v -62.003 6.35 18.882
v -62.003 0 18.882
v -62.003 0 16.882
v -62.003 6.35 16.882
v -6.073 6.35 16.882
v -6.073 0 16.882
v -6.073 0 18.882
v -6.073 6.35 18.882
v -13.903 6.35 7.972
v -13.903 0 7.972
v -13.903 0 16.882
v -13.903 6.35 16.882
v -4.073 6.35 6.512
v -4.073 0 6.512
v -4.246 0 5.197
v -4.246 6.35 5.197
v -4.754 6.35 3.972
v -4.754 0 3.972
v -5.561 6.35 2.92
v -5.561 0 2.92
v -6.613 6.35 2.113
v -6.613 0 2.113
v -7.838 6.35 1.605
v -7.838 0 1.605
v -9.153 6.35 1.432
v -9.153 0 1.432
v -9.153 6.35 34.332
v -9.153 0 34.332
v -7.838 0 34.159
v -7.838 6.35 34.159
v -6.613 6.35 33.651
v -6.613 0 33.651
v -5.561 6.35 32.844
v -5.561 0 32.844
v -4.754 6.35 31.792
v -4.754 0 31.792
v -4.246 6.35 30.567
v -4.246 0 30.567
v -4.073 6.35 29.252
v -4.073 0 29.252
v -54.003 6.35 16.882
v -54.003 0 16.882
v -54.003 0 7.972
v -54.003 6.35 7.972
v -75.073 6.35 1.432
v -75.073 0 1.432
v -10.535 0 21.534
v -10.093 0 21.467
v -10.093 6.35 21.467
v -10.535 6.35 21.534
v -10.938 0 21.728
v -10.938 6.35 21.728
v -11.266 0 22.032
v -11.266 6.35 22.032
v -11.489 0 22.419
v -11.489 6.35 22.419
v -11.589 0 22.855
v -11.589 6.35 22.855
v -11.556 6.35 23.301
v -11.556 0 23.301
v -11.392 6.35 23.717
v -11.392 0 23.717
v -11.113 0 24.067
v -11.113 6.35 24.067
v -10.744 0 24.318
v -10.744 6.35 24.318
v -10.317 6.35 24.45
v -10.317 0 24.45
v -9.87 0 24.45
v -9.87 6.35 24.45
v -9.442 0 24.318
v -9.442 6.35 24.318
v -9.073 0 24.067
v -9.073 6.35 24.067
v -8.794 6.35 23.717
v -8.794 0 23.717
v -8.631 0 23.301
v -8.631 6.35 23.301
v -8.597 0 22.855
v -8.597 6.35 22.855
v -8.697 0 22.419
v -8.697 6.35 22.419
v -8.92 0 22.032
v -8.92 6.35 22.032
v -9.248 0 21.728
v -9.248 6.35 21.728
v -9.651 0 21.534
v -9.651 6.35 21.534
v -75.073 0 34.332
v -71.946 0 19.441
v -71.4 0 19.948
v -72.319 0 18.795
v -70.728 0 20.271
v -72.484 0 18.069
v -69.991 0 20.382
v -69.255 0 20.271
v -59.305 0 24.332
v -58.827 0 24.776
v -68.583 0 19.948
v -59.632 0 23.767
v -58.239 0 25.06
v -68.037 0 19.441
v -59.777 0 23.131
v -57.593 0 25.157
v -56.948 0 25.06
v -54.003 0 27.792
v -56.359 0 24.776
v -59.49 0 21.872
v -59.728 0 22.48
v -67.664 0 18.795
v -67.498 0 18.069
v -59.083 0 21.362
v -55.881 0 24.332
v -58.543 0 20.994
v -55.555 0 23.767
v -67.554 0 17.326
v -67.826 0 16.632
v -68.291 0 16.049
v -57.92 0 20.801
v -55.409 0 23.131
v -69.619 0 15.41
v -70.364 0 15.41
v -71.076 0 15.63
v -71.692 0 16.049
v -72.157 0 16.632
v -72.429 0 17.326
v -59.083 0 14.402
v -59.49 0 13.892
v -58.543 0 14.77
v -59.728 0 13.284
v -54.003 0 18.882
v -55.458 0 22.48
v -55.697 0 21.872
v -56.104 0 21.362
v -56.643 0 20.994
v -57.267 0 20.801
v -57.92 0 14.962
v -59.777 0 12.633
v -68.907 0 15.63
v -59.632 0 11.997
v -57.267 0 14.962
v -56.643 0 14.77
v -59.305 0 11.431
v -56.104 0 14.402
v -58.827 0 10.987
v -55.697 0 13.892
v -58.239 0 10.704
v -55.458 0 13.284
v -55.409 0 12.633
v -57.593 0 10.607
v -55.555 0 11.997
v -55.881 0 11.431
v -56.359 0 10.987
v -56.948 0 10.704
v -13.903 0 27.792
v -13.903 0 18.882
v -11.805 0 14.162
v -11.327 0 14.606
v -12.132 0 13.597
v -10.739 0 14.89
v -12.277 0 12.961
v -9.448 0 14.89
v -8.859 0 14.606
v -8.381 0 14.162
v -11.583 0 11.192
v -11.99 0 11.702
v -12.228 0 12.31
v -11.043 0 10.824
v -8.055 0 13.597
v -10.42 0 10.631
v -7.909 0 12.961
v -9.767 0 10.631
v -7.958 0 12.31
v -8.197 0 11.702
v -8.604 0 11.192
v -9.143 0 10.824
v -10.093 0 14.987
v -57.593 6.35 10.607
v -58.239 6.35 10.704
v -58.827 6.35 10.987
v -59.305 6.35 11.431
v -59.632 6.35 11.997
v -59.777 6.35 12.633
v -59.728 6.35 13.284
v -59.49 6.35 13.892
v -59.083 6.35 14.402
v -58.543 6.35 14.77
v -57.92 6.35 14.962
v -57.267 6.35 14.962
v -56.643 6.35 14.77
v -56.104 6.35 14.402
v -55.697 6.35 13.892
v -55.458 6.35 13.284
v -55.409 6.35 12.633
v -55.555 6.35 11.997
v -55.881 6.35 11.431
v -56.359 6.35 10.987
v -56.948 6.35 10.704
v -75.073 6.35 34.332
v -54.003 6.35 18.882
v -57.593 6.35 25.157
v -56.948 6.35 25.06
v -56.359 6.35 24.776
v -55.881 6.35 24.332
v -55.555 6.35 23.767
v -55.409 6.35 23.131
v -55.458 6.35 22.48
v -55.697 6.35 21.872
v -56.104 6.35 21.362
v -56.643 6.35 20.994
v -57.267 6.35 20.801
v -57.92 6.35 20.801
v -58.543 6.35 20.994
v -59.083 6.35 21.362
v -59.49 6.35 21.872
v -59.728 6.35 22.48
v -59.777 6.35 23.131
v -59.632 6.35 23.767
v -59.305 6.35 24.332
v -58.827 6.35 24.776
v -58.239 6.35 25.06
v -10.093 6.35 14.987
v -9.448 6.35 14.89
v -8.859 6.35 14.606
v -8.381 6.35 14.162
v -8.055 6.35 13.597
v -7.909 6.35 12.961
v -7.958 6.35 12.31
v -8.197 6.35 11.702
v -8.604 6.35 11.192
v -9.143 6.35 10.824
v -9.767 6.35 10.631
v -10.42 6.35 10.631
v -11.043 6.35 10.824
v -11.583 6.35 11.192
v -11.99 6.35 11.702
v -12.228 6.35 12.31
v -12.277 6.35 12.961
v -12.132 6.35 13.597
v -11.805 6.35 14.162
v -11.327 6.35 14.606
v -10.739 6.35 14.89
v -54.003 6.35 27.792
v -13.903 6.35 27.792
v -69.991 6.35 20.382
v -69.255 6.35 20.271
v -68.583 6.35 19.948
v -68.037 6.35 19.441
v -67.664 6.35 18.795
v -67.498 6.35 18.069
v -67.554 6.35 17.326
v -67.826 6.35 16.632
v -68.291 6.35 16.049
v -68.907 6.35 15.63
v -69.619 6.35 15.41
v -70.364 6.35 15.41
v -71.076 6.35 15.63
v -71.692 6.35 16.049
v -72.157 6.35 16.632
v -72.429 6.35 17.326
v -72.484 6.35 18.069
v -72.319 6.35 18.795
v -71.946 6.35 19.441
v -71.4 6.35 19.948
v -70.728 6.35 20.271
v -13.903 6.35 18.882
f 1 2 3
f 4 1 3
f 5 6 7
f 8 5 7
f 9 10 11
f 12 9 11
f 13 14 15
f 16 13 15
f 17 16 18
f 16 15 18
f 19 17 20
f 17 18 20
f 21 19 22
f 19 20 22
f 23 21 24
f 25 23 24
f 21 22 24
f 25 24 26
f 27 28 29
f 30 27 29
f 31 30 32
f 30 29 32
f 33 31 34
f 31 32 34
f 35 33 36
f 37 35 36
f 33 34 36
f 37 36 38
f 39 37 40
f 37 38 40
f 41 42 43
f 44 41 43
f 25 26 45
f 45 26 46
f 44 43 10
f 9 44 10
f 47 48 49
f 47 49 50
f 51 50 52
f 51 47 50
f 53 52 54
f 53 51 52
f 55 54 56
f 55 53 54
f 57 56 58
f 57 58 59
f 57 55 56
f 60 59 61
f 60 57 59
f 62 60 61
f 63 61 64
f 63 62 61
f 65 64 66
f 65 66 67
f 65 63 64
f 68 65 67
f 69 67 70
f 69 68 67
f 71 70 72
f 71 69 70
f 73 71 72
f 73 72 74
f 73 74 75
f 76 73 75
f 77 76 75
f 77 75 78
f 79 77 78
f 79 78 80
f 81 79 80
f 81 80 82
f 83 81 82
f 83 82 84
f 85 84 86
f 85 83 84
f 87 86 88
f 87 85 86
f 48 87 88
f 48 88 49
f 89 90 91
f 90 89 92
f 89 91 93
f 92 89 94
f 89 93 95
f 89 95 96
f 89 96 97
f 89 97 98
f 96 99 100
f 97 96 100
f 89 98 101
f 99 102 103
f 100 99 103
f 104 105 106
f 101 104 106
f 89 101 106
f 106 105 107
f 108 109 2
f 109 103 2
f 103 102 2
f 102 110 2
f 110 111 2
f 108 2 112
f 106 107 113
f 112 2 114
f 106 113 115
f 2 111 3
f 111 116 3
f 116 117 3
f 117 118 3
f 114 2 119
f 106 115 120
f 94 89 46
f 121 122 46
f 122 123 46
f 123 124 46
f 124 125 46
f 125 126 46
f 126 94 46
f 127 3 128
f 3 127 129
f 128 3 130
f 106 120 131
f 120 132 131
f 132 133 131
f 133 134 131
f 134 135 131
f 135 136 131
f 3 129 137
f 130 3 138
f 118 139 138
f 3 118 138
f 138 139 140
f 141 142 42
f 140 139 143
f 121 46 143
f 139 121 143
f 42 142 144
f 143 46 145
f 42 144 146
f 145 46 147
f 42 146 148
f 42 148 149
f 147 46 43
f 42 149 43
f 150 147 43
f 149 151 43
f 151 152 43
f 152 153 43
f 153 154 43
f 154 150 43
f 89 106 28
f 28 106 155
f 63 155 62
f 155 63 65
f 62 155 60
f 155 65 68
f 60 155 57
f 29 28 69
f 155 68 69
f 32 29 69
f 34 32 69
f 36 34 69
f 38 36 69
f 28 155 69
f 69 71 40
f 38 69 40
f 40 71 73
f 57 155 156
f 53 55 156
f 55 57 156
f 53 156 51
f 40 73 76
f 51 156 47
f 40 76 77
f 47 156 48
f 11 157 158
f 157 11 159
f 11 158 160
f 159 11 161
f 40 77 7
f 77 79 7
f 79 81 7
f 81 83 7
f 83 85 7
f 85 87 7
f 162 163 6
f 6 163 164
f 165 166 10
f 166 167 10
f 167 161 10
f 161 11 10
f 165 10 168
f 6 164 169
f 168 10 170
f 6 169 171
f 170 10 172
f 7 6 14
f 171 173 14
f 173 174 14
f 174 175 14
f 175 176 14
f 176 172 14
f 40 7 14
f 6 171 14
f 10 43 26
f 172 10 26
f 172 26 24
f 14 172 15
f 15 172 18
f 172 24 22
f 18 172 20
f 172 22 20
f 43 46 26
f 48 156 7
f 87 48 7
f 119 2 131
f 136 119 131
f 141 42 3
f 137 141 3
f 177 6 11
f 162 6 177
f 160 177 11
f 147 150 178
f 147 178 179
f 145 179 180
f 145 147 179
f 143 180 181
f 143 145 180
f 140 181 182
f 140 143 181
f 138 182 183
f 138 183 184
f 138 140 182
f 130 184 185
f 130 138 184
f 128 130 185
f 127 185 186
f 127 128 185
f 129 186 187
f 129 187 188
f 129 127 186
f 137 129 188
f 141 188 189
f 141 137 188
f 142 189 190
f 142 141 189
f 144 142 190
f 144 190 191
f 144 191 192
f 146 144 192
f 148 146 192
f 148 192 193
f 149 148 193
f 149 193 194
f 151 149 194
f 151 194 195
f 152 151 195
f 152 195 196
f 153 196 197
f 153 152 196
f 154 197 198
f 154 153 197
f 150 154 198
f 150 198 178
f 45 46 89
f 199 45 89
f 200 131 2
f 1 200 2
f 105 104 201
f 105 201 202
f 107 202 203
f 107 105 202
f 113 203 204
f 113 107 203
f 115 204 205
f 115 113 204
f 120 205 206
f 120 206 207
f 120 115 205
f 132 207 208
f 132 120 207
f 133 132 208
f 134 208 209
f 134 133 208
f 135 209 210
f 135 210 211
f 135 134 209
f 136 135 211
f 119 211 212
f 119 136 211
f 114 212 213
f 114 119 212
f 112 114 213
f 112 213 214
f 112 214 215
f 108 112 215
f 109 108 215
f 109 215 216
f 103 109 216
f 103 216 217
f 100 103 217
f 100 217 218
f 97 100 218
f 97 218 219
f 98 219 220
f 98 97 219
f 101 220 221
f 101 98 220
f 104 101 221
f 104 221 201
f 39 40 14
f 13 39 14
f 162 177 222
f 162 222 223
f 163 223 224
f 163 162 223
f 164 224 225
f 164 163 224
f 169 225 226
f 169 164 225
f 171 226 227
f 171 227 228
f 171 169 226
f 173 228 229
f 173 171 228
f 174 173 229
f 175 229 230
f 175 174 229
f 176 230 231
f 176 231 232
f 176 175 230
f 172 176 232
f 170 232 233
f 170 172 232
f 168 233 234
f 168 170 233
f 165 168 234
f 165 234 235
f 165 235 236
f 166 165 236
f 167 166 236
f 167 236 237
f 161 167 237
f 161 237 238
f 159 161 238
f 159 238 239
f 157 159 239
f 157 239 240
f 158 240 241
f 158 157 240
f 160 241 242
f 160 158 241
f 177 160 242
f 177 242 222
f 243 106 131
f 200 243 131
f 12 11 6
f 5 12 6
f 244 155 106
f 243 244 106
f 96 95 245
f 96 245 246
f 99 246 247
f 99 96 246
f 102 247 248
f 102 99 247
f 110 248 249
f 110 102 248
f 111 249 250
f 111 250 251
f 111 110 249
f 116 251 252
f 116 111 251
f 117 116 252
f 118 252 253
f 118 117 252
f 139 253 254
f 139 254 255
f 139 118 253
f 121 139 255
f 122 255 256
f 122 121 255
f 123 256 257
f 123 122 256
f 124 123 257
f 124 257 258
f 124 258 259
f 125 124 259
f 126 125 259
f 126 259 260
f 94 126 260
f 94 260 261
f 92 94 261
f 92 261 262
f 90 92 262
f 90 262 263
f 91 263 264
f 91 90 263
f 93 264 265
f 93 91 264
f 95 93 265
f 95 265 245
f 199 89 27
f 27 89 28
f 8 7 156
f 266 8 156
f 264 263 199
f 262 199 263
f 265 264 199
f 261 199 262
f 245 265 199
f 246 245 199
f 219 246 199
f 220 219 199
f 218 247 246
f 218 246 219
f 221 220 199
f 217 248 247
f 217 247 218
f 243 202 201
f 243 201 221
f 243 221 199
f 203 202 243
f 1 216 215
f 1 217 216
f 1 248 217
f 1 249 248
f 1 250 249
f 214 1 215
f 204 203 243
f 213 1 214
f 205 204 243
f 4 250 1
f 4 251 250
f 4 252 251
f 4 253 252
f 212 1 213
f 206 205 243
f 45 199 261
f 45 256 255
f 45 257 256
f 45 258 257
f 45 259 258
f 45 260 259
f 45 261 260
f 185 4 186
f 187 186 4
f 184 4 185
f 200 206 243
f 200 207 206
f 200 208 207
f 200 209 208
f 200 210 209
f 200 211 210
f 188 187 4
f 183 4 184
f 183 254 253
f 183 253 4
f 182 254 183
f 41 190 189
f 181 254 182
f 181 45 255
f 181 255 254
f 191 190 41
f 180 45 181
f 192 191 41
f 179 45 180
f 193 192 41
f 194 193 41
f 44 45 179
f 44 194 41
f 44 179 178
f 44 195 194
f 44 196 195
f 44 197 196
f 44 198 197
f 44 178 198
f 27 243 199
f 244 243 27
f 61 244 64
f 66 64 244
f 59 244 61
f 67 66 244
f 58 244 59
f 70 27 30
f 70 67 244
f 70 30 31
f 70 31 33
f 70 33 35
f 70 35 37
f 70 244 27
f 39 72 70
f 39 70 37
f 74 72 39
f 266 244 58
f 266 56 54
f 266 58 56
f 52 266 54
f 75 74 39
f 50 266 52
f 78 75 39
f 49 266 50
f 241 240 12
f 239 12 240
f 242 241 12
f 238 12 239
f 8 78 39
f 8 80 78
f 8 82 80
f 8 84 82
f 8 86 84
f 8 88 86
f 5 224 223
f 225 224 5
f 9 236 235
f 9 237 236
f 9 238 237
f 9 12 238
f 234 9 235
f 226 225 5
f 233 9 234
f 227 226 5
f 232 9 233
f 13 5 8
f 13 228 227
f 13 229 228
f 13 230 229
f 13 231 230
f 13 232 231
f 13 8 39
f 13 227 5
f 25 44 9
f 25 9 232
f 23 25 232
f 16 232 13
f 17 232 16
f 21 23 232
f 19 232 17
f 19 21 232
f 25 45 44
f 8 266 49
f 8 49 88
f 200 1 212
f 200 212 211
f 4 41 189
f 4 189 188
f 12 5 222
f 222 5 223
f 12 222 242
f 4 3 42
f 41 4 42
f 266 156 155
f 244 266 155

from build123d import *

# Parameters (mm, degrees)
SKETCH1_R           = 2.19
SKETCH1_R_2         = 2.5
SKETCH1_R_3         = 1.5
BOSS_EXTRUDE1_DEPTH = 6.35


with BuildPart() as part:
    # Sketch1 → Boss-Extrude1 (new body)
    with BuildSketch(Plane(origin=(0, 0, 0), x_dir=(1, 0, 0), z_dir=(0, 1, 0))):
        with BuildLine():
            Line((-9.153018436, -1.431925443), (-66.073018436, -1.431925443))
            Line((-66.073018436, -1.431925443), (-75.073018436, -1.431925443))
            Line((-75.073018436, -1.431925443), (-75.073018436, -6.511925443))
            Line((-75.073018436, -6.511925443), (-75.073018436, -29.251925443))
            Line((-75.073018436, -29.251925443), (-75.073018436, -34.331925443))
            Line((-75.073018436, -34.331925443), (-66.073018436, -34.331925443))
            Line((-66.073018436, -34.331925443), (-9.153018436, -34.331925443))
            ThreePointArc((-9.153018436, -34.331925443), (-5.560915987, -32.844027891), (-4.073018436, -29.251925443))
            Line((-4.073018436, -29.251925443), (-4.073018436, -6.511925443))
            ThreePointArc((-4.073018436, -6.511925443), (-5.560915987, -2.919822995), (-9.153018436, -1.431925443))
        make_face()
        with Locations(Location((-57.593170924, -22.966925443, 0), (0, 0, 270))):
            Circle(SKETCH1_R, mode=Mode.SUBTRACT)
        with Locations(Location((-57.593170924, -12.796925443, 0), (0, 0, 90))):
            Circle(SKETCH1_R, mode=Mode.SUBTRACT)
        with Locations(Location((-10.093170924, -12.796925443, 0), (0, 0, 270))):
            Circle(SKETCH1_R, mode=Mode.SUBTRACT)
        with Locations(Location((-69.991443077, -17.881925443, 0), (0, 0, 270))):
            Circle(SKETCH1_R_2, mode=Mode.SUBTRACT)
        with Locations(Location((-10.093170924, -22.966925443, 0), (0, 0, 90))):
            Circle(SKETCH1_R_3, mode=Mode.SUBTRACT)
        Polygon((-13.903170924, -18.881925443), (-13.903170924, -27.791925443), (-54.003170924, -27.791925443), (-54.003170924, -18.881925443), (-62.003170924, -18.881925443), (-62.003170924, -16.881925443), (-54.003170924, -16.881925443), (-54.003170924, -7.971925443), (-13.903170924, -7.971925443), (-13.903170924, -16.881925443), (-6.073018436, -16.881925443), (-6.073018436, -18.881925443), align=None, mode=Mode.SUBTRACT)
    extrude(amount=BOSS_EXTRUDE1_DEPTH)


solid = part.part
